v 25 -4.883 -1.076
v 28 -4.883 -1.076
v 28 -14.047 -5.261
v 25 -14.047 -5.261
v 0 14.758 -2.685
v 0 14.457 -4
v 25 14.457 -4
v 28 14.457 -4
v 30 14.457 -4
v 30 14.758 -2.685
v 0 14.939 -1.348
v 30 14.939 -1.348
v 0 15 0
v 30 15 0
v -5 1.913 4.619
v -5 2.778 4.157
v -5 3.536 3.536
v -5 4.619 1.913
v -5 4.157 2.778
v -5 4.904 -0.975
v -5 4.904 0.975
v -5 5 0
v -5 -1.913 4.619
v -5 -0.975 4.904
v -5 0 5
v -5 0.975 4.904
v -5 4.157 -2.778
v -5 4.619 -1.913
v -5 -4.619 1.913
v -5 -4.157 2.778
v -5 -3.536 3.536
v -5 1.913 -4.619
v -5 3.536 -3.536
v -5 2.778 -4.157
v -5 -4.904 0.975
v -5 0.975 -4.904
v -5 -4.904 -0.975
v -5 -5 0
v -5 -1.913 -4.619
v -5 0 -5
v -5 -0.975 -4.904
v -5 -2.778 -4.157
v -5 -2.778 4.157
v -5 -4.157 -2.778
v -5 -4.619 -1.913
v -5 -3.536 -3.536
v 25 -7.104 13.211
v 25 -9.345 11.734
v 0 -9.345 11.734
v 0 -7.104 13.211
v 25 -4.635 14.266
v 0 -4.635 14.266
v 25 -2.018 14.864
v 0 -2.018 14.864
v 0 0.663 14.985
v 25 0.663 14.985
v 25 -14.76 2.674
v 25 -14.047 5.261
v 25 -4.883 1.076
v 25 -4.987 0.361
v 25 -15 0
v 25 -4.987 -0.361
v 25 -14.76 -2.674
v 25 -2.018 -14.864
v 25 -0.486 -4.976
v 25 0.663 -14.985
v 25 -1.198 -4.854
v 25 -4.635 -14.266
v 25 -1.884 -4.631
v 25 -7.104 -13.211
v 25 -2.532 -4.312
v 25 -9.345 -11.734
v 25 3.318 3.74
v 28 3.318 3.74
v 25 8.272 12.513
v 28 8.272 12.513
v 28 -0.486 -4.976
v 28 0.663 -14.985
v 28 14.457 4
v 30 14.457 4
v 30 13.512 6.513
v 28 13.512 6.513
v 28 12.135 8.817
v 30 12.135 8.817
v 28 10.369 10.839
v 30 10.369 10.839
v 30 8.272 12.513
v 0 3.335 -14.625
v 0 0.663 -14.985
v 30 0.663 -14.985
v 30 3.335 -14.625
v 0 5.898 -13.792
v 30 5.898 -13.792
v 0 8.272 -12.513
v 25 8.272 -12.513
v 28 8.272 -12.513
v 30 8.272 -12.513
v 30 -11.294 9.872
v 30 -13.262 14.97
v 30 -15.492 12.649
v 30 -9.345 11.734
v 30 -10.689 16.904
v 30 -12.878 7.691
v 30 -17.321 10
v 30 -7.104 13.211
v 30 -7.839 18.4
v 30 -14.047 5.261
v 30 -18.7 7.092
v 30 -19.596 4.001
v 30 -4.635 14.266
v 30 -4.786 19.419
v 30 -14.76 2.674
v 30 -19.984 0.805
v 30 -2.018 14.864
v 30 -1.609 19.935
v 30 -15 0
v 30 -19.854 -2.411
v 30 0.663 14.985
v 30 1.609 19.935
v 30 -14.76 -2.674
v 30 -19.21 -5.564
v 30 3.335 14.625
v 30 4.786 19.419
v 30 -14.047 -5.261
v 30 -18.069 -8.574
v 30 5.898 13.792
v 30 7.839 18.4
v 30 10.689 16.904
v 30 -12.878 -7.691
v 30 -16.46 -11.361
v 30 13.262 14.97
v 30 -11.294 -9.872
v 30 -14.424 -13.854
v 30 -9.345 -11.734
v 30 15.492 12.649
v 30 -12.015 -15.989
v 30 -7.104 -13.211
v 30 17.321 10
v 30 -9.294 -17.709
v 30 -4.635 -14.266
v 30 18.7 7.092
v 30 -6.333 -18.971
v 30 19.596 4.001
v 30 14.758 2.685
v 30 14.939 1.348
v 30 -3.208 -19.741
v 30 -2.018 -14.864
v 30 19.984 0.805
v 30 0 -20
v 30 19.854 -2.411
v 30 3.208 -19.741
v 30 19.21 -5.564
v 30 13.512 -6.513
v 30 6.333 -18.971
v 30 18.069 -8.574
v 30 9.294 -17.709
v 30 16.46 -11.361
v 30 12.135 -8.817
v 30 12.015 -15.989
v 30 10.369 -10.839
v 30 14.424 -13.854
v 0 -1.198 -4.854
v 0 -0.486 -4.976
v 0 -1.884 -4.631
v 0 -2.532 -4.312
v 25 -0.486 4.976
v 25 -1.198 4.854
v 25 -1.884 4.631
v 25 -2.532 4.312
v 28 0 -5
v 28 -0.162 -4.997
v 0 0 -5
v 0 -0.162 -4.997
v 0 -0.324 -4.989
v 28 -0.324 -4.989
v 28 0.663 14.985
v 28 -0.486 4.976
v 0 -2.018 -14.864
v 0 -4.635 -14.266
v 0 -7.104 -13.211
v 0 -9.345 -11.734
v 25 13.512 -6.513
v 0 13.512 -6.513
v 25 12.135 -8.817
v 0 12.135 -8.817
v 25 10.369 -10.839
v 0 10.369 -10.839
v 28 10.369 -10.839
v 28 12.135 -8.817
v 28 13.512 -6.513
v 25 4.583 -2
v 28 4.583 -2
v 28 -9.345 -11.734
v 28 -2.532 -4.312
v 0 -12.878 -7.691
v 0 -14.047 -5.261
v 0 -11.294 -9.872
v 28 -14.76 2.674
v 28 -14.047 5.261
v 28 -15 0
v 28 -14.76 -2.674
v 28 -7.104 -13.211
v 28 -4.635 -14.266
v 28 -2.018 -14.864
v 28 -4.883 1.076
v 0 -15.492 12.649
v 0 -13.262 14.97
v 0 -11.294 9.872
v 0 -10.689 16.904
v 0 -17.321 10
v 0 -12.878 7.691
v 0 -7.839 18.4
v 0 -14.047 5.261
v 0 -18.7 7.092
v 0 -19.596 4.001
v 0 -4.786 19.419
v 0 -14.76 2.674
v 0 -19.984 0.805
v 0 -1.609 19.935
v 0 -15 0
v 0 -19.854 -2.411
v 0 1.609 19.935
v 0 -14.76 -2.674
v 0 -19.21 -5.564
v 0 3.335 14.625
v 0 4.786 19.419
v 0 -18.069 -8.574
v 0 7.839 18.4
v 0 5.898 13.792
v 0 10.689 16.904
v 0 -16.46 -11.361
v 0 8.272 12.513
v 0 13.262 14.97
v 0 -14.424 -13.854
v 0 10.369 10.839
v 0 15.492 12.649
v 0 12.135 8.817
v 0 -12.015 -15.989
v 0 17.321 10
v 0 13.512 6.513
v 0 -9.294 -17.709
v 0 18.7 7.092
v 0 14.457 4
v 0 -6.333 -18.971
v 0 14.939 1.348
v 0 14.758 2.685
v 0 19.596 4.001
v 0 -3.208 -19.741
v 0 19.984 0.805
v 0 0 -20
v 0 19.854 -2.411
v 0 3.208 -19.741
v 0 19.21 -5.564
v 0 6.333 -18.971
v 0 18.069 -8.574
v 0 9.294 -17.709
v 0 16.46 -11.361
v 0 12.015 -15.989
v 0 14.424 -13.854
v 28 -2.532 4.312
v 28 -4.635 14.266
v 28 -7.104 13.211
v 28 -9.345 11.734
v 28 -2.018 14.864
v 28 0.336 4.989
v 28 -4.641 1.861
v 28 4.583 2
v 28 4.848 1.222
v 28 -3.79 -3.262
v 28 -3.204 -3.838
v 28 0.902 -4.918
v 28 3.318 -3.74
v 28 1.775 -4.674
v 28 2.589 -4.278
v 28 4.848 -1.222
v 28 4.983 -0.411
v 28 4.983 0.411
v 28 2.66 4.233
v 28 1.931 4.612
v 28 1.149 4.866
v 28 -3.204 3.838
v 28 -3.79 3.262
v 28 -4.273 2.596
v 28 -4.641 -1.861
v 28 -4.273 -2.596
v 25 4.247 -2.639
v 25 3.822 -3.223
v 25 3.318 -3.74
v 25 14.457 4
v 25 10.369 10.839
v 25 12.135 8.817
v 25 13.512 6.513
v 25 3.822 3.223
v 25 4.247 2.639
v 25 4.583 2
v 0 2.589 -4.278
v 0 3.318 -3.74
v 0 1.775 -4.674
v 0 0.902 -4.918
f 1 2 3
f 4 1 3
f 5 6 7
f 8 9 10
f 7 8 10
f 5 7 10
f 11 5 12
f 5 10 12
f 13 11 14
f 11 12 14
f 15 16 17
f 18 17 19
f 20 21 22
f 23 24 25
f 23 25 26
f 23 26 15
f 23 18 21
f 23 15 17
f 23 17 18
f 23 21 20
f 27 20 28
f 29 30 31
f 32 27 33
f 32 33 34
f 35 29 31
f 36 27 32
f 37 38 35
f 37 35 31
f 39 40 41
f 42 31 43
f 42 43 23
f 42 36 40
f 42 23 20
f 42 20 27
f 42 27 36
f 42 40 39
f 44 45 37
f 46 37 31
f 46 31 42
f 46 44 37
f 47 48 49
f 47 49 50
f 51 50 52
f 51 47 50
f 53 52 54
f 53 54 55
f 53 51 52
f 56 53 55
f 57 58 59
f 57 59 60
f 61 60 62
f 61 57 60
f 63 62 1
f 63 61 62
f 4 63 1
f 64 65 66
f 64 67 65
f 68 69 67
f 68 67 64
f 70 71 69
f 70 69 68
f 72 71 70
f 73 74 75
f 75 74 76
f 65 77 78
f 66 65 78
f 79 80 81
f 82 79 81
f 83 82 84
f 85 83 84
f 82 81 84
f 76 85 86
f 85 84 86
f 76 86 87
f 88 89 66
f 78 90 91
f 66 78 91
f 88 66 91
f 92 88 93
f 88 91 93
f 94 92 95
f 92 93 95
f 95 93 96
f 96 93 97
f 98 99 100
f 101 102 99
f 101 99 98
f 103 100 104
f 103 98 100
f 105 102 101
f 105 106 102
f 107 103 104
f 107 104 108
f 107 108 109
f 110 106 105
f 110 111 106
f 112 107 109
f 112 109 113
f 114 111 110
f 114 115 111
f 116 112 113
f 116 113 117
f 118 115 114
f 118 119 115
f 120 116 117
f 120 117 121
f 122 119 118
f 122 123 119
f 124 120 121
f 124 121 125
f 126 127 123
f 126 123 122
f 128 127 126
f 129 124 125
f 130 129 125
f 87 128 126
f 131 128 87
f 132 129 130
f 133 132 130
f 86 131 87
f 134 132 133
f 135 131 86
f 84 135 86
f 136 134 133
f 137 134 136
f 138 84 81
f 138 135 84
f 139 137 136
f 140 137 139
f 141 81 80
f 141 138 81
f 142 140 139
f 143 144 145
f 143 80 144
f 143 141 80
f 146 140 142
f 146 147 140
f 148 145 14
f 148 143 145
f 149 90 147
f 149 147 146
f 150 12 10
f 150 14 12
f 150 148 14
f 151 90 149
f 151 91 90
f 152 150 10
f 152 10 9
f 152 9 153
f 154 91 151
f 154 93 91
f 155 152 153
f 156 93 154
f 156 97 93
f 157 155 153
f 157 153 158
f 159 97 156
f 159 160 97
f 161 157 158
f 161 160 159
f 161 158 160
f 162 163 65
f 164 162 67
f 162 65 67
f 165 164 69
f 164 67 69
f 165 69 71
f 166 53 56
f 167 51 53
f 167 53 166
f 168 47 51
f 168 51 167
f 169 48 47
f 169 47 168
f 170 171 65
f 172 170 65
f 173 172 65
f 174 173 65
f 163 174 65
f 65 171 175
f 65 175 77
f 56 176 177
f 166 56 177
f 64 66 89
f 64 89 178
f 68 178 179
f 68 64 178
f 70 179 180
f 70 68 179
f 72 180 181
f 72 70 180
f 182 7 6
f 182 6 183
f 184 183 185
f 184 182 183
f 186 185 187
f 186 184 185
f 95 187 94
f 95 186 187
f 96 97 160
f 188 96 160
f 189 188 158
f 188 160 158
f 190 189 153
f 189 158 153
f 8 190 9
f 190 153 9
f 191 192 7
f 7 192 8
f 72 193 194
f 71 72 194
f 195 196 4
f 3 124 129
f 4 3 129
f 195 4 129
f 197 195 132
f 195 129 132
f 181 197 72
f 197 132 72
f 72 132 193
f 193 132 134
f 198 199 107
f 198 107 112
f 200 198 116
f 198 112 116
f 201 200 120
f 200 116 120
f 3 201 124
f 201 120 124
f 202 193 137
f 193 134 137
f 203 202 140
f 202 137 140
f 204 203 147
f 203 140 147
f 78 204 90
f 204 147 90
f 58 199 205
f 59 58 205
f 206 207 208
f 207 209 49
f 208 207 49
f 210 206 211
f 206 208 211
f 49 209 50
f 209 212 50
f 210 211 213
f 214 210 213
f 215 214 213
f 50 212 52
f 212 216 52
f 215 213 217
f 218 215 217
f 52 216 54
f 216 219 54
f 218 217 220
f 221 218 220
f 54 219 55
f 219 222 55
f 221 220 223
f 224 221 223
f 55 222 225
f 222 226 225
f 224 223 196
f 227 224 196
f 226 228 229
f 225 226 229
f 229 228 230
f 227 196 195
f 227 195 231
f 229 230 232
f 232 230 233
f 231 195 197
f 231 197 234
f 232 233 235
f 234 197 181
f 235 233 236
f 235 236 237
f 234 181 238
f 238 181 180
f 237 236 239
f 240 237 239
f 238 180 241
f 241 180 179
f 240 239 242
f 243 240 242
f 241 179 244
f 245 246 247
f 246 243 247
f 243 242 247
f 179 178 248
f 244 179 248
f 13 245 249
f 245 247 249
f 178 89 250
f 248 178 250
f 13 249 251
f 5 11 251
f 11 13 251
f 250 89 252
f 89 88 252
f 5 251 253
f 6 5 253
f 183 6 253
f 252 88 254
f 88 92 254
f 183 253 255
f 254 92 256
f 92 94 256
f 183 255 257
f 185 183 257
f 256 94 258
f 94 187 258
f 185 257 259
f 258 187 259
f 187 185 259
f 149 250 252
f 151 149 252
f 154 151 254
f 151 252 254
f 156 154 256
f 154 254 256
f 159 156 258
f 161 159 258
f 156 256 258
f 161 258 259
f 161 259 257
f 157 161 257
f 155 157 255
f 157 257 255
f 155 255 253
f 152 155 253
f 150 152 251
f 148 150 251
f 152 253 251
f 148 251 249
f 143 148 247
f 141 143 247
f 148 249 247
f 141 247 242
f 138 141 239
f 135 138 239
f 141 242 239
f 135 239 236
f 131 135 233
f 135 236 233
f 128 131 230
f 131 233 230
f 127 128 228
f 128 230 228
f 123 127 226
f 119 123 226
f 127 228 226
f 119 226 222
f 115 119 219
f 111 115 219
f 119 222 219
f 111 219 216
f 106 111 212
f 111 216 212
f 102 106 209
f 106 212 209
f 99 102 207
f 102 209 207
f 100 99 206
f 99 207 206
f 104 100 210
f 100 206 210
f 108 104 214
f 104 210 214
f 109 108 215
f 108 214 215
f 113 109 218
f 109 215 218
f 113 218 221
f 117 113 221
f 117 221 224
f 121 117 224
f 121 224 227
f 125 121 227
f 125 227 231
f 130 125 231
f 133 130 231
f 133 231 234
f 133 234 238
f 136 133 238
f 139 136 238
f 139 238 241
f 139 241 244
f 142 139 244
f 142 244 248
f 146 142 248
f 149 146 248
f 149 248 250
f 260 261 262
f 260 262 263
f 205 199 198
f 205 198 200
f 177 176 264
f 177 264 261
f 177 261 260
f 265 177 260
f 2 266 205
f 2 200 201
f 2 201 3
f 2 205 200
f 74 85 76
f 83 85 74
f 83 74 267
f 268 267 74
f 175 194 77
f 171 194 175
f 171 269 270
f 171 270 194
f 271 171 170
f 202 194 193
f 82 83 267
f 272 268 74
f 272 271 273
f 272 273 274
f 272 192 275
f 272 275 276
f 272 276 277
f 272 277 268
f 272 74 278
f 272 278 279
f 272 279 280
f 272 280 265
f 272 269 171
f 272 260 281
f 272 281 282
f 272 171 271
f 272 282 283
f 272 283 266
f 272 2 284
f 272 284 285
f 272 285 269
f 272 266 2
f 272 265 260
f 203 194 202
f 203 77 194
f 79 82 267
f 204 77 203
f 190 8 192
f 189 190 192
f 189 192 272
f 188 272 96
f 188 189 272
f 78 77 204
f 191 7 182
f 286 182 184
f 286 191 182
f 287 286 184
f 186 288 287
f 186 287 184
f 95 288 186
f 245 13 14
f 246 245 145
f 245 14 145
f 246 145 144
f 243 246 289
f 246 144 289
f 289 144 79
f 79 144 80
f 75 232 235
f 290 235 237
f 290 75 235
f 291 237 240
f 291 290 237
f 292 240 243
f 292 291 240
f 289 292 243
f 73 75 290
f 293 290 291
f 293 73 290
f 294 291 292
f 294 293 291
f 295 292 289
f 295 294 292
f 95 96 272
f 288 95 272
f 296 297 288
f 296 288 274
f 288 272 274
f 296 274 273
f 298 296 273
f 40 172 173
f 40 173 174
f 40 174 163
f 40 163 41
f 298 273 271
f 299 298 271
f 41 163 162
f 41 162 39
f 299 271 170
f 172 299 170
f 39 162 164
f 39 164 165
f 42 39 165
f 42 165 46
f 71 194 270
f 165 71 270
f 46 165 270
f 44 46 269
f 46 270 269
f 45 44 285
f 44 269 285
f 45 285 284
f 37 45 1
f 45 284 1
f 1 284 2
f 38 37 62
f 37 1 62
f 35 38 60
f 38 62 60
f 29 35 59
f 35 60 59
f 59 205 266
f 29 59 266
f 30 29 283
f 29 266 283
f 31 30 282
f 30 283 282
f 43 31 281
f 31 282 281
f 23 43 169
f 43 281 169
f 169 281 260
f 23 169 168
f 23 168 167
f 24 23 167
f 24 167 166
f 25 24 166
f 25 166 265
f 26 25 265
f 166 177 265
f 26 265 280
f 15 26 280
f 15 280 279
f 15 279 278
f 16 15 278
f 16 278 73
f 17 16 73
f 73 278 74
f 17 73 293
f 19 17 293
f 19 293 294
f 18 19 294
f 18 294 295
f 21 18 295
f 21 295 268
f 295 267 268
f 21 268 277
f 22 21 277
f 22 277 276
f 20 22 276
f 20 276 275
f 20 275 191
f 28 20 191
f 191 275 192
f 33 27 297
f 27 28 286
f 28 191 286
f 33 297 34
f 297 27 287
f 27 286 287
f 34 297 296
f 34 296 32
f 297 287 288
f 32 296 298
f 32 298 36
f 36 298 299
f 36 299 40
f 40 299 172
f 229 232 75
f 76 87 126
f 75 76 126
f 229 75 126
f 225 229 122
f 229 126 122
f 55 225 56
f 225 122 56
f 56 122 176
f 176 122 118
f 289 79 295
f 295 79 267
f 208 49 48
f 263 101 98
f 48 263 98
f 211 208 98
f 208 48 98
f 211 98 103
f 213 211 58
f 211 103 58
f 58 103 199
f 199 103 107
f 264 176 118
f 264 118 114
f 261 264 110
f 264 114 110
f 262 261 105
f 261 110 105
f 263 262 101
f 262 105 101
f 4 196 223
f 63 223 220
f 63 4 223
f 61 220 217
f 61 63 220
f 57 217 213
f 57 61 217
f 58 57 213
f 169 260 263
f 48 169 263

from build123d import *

# Parameters (mm, degrees)
SKETCH1_R           = 20
BOSS_EXTRUDE1_DEPTH = 30
SKETCH2_R           = 5
BOSS_EXTRUDE2_DEPTH = 5
CUT_EXTRUDE1_REACH  = 47
CUT_EXTRUDE2_START  = -25
SKETCH4_R           = 15
SKETCH4_R_2         = 5
CUT_EXTRUDE2_DEPTH  = 25
SKETCH5_R           = 15
CUT_EXTRUDE3_DEPTH  = 2


with BuildPart() as part:
    # Sketch1 → Boss-Extrude1 (new body)
    with BuildSketch(Plane(origin=(0, 0, 0), x_dir=(0, 0, -1), z_dir=(1, 0, 0))):
        Circle(SKETCH1_R)
    extrude(amount=BOSS_EXTRUDE1_DEPTH)

    # Sketch2 → Boss-Extrude2 (add)
    with BuildSketch(Plane.ZY):
        with Locations(Location((0, 0, 0), (0, 0, 180))):
            Circle(SKETCH2_R)
    extrude(amount=BOSS_EXTRUDE2_DEPTH)

    # Sketch3 → Cut-Extrude1 (cut, up to next)
    with BuildSketch(Plane(origin=(30, 0, 0), x_dir=(0, 0, -1), z_dir=(1, 0, 0)), mode=Mode.PRIVATE) as cut_extrude1_sk1:
        with BuildLine():
            Line((0, 5), (0, 15))
            ThreePointArc((0, 15), (-2.018355219, 14.863587797), (-4, 14.456832295))
            Line((-4, 14.456832295), (-2, 4.582575695))
            ThreePointArc((-2, 4.582575695), (-1.021548218, 4.894531565), (0, 5))
        make_face()
    cut_extrude1_tool1 = extrude(cut_extrude1_sk1.sketch, amount=-CUT_EXTRUDE1_REACH, mode=Mode.PRIVATE) & part.part
    # Sketch3 → Cut-Extrude1 (cut, up to next)
    with BuildSketch(Plane(origin=(30, 0, 0), x_dir=(0, 0, -1), z_dir=(1, 0, 0)), mode=Mode.PRIVATE) as cut_extrude1_sk2:
        with BuildLine():
            ThreePointArc((4, 14.456832295), (2.018355219, 14.863587797), (0, 15))
            Line((0, 15), (0, 5))
            ThreePointArc((0, 5), (1.021548218, 4.894531565), (2, 4.582575695))
            Line((2, 4.582575695), (4, 14.456832295))
        make_face()
    cut_extrude1_tool2 = extrude(cut_extrude1_sk2.sketch, amount=-CUT_EXTRUDE1_REACH, mode=Mode.PRIVATE) & part.part
    # Sketch3 → Cut-Extrude1 (cut, up to next)
    with BuildSketch(Plane(origin=(30, 0, 0), x_dir=(0, 0, -1), z_dir=(1, 0, 0)), mode=Mode.PRIVATE) as cut_extrude1_sk3:
        with BuildLine():
            Line((-3.740254487, 3.3182068), (-12.513196581, 8.271632929))
            ThreePointArc((-12.513196581, 8.271632929), (-14.265847744, 4.635254916), (-14.985332536, 0.663180799))
            Line((-14.985332536, 0.663180799), (-4.976322465, -0.486019265))
            ThreePointArc((-4.976322465, -0.486019265), (-4.755282581, 1.545084972), (-3.740254487, 3.3182068))
        make_face()
    cut_extrude1_tool3 = extrude(cut_extrude1_sk3.sketch, amount=-CUT_EXTRUDE1_REACH, mode=Mode.PRIVATE) & part.part
    # Sketch3 → Cut-Extrude1 (cut, up to next)
    with BuildSketch(Plane(origin=(30, 0, 0), x_dir=(0, 0, -1), z_dir=(1, 0, 0)), mode=Mode.PRIVATE) as cut_extrude1_sk4:
        with BuildLine():
            Line((-5.26144484, -14.04696402), (-1.075536422, -4.88295212))
            ThreePointArc((-1.075536422, -4.88295212), (-2.938926261, -4.045084972), (-4.3116044, -2.531811111))
            Line((-4.3116044, -2.531811111), (-11.733580795, -9.344682002))
            ThreePointArc((-11.733580795, -9.344682002), (-8.816778784, -12.135254916), (-5.26144484, -14.04696402))
        make_face()
    cut_extrude1_tool4 = extrude(cut_extrude1_sk4.sketch, amount=-CUT_EXTRUDE1_REACH, mode=Mode.PRIVATE) & part.part
    # Sketch3 → Cut-Extrude1 (cut, up to next)
    with BuildSketch(Plane(origin=(30, 0, 0), x_dir=(0, 0, -1), z_dir=(1, 0, 0)), mode=Mode.PRIVATE) as cut_extrude1_sk5:
        with BuildLine():
            ThreePointArc((4.3116044, -2.531811111), (2.938926261, -4.045084972), (1.075536422, -4.88295212))
            Line((1.075536422, -4.88295212), (5.26144484, -14.04696402))
            ThreePointArc((5.26144484, -14.04696402), (8.816778784, -12.135254916), (11.733580795, -9.344682002))
            Line((11.733580795, -9.344682002), (4.3116044, -2.531811111))
        make_face()
    cut_extrude1_tool5 = extrude(cut_extrude1_sk5.sketch, amount=-CUT_EXTRUDE1_REACH, mode=Mode.PRIVATE) & part.part
    # Sketch3 → Cut-Extrude1 (cut, up to next)
    with BuildSketch(Plane(origin=(30, 0, 0), x_dir=(0, 0, -1), z_dir=(1, 0, 0)), mode=Mode.PRIVATE) as cut_extrude1_sk6:
        with BuildLine():
            ThreePointArc((14.985332536, 0.663180799), (14.265847744, 4.635254916), (12.513196581, 8.271632929))
            Line((12.513196581, 8.271632929), (3.740254487, 3.3182068))
            ThreePointArc((3.740254487, 3.3182068), (4.67446641, 1.774644692), (5, 0))
            ThreePointArc((5, 0), (4.994077108, -0.243297838), (4.976322465, -0.486019265))
            Line((4.976322465, -0.486019265), (14.985332536, 0.663180799))
        make_face()
    cut_extrude1_tool6 = extrude(cut_extrude1_sk6.sketch, amount=-CUT_EXTRUDE1_REACH, mode=Mode.PRIVATE) & part.part
    add(cut_extrude1_tool1.solids().sort_by_distance((30, 10.385553, 1.567824))[0], mode=Mode.SUBTRACT)
    add(cut_extrude1_tool2.solids().sort_by_distance((30, 10.385553, -1.567824))[0], mode=Mode.SUBTRACT)
    add(cut_extrude1_tool3.solids().sort_by_distance((30, 3.209313, 9.877248))[0], mode=Mode.SUBTRACT)
    add(cut_extrude1_tool4.solids().sort_by_distance((30, -8.402089, 6.104475))[0], mode=Mode.SUBTRACT)
    add(cut_extrude1_tool5.solids().sort_by_distance((30, -8.402089, -6.104475))[0], mode=Mode.SUBTRACT)
    add(cut_extrude1_tool6.solids().sort_by_distance((30, 3.209313, -9.877248))[0], mode=Mode.SUBTRACT)

    # Sketch4 → Cut-Extrude2 (cut)
    with BuildSketch(Plane.ZY.offset(CUT_EXTRUDE2_START)):
        with Locations(Location((0, 0, 0), (0, 0, 180))):
            Circle(SKETCH4_R)
        with Locations(Location((0, 0, 0), (0, 0, 185.578178478))):
            Circle(SKETCH4_R_2, mode=Mode.SUBTRACT)
    extrude(amount=CUT_EXTRUDE2_DEPTH, mode=Mode.SUBTRACT)

    # Sketch5 → Cut-Extrude3 (cut)
    with BuildSketch(Plane(origin=(30, 0, 0), x_dir=(0, 0, -1), z_dir=(1, 0, 0))):
        Circle(SKETCH5_R)
    extrude(amount=-CUT_EXTRUDE3_DEPTH, mode=Mode.SUBTRACT)


solid = part.part
